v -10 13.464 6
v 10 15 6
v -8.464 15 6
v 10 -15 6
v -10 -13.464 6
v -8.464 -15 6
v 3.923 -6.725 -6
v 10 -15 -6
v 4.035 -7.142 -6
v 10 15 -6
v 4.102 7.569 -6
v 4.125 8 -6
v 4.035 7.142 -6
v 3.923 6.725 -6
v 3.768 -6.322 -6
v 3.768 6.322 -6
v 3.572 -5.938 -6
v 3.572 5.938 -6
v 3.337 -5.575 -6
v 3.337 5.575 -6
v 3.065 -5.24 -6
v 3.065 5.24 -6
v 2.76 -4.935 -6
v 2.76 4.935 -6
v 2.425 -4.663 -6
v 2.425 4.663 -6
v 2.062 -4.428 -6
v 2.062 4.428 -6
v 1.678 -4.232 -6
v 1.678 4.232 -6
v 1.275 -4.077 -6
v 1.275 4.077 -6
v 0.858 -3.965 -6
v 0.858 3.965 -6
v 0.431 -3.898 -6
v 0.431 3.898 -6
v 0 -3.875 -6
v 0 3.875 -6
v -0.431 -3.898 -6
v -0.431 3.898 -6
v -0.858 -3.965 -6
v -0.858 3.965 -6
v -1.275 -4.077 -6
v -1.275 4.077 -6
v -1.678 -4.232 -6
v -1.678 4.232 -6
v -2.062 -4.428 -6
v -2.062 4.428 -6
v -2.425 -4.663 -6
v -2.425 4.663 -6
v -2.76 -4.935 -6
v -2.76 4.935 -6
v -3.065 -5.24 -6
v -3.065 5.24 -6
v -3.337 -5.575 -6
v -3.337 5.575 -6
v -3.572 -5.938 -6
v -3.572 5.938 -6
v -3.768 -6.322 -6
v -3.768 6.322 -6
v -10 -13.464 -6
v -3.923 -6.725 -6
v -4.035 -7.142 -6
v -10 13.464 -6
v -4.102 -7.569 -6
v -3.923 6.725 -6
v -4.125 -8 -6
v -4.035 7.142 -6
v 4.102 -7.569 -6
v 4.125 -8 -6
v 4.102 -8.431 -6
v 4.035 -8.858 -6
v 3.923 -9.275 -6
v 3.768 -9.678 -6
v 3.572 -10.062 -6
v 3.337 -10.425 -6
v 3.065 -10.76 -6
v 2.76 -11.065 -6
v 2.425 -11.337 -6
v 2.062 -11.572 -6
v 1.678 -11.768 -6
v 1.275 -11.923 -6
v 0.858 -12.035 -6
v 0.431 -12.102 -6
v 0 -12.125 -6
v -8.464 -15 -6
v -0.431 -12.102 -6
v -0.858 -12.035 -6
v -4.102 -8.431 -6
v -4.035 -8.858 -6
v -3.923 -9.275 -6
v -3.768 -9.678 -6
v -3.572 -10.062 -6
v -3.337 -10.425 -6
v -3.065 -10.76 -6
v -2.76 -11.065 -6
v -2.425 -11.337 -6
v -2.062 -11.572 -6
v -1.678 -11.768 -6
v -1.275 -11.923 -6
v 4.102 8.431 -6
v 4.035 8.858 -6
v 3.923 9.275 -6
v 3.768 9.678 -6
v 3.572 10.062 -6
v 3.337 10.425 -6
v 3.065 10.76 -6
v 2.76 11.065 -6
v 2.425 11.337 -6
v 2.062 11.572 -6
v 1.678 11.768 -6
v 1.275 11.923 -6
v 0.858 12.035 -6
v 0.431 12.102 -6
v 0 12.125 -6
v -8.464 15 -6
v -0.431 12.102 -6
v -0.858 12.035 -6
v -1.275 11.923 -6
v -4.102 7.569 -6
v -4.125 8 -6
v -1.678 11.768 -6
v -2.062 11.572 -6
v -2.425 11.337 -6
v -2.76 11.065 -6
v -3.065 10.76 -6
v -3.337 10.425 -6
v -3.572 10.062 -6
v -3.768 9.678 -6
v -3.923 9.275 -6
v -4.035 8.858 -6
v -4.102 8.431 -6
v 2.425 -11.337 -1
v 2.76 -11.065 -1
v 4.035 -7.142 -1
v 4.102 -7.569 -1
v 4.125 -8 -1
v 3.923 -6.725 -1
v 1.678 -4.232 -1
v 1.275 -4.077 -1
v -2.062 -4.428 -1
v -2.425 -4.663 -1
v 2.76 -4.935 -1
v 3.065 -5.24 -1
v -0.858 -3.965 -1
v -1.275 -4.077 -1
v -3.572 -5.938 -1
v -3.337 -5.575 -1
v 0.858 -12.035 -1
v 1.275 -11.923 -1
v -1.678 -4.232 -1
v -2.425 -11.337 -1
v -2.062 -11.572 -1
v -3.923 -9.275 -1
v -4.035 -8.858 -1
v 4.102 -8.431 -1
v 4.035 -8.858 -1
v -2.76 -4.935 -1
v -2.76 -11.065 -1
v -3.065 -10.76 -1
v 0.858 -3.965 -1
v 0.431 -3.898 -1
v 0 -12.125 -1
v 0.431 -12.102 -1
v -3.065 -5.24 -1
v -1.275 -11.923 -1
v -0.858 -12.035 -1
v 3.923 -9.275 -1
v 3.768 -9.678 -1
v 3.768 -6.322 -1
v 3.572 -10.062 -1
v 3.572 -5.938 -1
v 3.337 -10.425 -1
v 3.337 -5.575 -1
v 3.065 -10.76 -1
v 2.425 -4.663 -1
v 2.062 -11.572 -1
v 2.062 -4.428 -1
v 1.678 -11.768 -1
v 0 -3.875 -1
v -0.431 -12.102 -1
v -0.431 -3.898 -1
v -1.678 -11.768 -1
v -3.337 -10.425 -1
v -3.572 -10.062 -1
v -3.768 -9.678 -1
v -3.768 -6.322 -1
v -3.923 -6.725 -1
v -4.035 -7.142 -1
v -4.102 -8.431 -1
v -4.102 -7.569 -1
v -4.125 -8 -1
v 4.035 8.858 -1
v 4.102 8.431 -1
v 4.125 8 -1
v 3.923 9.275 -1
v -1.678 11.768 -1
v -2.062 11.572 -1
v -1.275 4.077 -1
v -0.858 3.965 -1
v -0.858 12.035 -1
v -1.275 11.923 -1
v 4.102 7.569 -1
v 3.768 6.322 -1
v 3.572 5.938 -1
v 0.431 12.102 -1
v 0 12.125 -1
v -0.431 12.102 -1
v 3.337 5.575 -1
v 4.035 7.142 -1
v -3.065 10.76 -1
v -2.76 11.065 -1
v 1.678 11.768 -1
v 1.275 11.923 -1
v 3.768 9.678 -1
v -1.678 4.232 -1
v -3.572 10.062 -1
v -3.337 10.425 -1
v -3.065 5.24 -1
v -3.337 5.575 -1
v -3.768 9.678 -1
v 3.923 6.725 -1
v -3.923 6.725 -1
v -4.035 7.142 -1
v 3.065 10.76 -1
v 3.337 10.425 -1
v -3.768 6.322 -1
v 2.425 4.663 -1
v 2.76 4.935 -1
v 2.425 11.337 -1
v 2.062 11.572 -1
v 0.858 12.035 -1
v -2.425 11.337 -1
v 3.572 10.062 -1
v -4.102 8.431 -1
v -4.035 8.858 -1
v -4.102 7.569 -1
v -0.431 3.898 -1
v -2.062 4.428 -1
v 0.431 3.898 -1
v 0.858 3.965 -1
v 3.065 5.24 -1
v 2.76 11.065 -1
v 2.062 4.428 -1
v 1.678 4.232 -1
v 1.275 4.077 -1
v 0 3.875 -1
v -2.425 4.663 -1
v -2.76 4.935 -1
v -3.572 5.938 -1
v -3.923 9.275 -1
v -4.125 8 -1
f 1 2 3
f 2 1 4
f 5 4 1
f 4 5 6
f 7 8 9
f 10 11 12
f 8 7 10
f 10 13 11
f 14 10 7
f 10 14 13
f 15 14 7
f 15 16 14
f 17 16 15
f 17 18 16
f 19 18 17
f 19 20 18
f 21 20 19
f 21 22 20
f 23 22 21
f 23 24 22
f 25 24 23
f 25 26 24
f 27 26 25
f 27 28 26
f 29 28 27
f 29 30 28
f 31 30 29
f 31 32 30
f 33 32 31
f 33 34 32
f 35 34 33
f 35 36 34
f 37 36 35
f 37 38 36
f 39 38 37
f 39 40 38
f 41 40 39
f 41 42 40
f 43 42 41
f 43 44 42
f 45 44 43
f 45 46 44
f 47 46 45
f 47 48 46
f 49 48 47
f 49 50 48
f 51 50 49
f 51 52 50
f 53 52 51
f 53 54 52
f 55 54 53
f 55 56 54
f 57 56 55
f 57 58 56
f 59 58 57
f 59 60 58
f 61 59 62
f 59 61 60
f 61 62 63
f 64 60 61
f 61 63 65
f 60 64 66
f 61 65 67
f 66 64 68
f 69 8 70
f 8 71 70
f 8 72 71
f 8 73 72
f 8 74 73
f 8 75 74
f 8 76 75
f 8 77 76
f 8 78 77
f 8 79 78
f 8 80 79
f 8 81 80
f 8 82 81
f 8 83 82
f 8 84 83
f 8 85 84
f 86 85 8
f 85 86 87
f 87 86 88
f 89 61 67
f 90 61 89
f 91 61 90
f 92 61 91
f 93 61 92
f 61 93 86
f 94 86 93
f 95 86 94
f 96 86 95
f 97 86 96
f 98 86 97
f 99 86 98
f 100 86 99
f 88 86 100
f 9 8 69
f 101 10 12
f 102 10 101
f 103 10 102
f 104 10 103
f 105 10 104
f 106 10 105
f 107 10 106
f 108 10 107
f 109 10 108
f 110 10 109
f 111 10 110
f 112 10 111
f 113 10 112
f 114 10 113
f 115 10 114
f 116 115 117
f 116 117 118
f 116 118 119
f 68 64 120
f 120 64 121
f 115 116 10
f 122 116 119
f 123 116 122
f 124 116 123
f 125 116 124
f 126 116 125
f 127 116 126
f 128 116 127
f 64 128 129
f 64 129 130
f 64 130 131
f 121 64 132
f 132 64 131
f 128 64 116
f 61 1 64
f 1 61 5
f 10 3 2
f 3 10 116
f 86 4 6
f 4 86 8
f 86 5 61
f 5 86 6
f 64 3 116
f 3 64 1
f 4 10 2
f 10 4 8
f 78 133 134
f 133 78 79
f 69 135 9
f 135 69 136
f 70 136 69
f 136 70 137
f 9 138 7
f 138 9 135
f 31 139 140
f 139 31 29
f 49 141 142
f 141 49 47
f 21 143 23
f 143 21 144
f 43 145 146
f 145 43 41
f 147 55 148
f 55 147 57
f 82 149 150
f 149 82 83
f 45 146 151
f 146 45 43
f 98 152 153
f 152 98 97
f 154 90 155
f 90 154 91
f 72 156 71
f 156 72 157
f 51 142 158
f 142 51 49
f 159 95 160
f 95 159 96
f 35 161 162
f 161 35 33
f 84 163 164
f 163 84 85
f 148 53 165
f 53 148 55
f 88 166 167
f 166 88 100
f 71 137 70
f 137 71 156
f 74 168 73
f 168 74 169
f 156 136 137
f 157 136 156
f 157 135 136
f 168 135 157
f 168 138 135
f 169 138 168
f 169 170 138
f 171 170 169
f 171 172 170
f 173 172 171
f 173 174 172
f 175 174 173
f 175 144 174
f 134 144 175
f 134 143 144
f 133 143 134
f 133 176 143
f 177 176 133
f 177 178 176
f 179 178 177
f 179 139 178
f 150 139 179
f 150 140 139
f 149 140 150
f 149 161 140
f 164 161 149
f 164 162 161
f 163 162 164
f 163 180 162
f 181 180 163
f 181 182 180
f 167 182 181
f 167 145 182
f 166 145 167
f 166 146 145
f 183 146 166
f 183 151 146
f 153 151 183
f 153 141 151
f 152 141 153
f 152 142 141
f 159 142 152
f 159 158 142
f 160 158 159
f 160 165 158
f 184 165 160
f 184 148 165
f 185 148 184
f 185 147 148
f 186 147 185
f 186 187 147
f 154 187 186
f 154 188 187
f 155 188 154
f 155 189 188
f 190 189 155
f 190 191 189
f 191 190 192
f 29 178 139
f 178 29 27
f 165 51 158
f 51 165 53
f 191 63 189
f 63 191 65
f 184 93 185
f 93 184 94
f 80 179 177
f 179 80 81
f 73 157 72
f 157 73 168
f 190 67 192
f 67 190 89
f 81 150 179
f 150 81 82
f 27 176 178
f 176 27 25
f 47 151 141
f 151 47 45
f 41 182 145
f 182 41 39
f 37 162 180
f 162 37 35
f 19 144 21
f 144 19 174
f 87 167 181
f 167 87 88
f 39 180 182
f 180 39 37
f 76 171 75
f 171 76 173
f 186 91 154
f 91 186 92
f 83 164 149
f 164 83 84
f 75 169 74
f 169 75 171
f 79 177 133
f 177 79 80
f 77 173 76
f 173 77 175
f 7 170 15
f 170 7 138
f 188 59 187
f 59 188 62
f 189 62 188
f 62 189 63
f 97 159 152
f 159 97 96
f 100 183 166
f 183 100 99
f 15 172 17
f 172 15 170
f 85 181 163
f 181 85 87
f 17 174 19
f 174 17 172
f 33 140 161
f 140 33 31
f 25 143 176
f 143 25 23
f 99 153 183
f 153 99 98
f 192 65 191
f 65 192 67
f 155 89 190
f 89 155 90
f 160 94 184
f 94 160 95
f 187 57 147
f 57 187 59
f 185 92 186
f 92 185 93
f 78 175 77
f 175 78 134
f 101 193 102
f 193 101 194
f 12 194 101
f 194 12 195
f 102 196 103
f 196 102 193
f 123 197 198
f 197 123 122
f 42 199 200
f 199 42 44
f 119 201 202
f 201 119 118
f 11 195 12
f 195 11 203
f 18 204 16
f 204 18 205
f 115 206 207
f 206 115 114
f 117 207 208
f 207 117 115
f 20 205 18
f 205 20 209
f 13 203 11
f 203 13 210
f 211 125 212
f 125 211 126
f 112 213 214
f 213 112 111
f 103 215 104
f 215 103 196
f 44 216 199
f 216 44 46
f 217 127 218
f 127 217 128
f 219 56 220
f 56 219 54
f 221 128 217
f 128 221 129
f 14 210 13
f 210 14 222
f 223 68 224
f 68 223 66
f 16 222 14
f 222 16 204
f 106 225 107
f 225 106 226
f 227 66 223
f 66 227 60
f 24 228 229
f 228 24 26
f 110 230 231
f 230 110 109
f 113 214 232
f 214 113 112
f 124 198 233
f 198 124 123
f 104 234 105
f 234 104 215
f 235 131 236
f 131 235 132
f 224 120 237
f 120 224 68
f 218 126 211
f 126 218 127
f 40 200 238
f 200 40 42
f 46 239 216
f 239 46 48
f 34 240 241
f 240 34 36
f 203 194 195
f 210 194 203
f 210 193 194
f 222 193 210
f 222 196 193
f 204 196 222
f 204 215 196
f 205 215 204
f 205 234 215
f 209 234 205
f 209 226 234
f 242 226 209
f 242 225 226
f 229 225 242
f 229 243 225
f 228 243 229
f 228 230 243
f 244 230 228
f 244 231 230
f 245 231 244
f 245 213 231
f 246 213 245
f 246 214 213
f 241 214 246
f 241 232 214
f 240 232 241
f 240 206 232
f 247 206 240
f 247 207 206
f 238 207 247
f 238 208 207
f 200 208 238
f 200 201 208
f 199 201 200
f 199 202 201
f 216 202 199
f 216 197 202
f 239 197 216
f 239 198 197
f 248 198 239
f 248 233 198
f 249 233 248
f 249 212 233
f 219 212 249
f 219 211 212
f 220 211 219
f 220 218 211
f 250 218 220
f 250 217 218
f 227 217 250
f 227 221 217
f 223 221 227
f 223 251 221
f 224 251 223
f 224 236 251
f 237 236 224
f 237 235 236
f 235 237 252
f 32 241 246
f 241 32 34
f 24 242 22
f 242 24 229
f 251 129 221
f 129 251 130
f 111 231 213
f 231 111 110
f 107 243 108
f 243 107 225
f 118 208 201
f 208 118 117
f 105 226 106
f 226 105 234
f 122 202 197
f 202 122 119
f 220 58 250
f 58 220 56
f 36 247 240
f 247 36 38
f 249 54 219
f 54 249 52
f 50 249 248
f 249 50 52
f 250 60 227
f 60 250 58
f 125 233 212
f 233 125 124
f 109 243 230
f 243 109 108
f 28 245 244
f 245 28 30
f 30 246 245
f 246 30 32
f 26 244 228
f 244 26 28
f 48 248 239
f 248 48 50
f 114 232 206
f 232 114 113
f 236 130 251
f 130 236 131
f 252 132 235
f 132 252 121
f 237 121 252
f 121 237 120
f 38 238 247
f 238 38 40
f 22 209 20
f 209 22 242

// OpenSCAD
$fn=60;
width=30;
pad=5;
offset=3;
fudge=0.25;

//main_filler();
top_filler();

module top_filler(height=12){
intersection(){
    difference(){
        base_filler(height=height);
        for(Y=[-1,1]){
            translate([0,8*Y,-height/2-5]) 
                cylinder(d=8+fudge, h=10);
//            translate([0, ((width+pad)/2)*Y,0])
//            %cube([10, pad, height], center=true);
        }
    }
    cube([25, width, height], center=true);
}
}

module bottom_filler(height=40, inside=20, slot=15){
    difference(){
        base_filler(height=height);
        translate([0,0,(height/2)-inside+slot-3.5])
        hull(){
            for(X=[25, 5.9], Z=[0, -height])
            translate([X,offset/2,Z]) rotate([90,0,0]) 
            cylinder(d=7, h=offset*2+width+pad*2, center=true);
        }
    }
    for(Y=[-1,1]) translate([0,8*Y,height/2-5]) 
        cylinder(d=8, h=10);
}

module main_filler(height=100){
    difference(){
        base_filler(height=height);
        for(Y=[-1,1]) translate([0,8*Y,-height/2-5]) 
            cylinder(d=8+fudge, h=10);
    }
    for(Y=[-1,1]) translate([0,8*Y,height/2-5]) 
        cylinder(d=8, h=10);
}

module base_filler(height=100){
    difference(){
        union(){
            cube([20,width,height],center=true);
            translate([10,0,0]) 
                cube([10+pad,width+pad*2,height],center=true);
            translate([10,offset/2,0]) 
                cube([10+pad,offset+width+pad*2,height],center=true);
        }
        for(Y=[-1,1]) translate([-11,16*Y,0]) rotate([0,0,45*Y]) 
            cube([5,5,height+2], center=true);
        for(Y=[-1,1]) translate([2,(21+offset/2)*Y+(offset/2),0])
            rotate([0,0,45*Y]) 
            cube([5,5,height+2], center=true);
        for(Y=[-1,1]) translate([19,(21+offset/2)*Y+(offset/2),0])
            rotate([0,0,45*Y]) 
            cube([5,5,height+2], center=true);
        for(Y=[-1,1]) translate([19,(14+offset/2)*Y+(offset/2),0]) 
            rotate([0,0,45*Y]) 
            cube([5,5,height+2], center=true);
        translate([20,offset/2,0])
            cube([20,width+offset,height+2],center=true);
    }
}
